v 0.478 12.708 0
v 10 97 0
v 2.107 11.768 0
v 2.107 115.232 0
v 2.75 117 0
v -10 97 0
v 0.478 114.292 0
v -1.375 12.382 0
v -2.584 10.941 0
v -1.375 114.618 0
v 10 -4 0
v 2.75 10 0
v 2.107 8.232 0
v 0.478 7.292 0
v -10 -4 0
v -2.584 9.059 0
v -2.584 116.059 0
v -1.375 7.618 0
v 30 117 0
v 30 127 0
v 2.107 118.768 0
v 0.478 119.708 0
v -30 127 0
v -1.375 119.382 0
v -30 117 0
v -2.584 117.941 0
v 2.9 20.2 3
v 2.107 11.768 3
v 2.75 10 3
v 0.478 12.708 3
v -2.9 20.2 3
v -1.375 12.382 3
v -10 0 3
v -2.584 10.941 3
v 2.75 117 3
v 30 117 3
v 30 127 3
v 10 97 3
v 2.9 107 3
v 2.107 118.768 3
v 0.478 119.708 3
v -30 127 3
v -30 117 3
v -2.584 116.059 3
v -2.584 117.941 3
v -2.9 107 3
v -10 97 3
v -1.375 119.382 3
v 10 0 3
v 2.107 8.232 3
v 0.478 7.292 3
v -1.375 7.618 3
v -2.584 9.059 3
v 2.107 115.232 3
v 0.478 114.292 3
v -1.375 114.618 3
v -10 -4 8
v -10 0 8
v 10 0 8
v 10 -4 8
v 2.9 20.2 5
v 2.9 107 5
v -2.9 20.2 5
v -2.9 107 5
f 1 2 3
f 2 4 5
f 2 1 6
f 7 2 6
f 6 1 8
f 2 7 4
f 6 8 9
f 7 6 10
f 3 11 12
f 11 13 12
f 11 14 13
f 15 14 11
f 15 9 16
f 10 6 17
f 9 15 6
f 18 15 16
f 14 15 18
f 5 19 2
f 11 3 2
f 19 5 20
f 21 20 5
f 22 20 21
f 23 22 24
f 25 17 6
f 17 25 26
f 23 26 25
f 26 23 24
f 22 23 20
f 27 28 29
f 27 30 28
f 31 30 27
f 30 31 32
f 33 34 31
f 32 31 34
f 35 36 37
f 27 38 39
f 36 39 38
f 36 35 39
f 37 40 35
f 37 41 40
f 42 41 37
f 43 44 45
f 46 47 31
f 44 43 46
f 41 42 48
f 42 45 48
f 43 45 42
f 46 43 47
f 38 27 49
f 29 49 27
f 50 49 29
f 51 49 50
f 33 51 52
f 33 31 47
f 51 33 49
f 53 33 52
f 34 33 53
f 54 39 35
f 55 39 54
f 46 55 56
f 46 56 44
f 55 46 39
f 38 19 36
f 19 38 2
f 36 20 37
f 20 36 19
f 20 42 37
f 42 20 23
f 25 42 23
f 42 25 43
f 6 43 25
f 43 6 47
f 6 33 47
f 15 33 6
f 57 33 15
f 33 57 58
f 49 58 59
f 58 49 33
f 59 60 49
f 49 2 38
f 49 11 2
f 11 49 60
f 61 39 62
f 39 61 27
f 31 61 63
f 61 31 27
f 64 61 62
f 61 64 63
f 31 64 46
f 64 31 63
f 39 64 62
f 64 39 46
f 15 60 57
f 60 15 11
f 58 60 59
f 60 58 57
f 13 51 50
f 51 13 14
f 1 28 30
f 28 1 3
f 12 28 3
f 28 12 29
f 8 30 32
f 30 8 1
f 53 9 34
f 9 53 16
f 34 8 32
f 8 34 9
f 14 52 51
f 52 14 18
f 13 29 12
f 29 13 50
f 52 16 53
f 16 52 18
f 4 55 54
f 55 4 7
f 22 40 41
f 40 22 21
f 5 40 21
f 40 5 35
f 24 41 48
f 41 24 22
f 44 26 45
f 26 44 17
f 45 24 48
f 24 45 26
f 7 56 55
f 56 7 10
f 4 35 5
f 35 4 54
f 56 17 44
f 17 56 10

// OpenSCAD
// AM8 Z frame alignment jig
tolerance = 0.2;    // makes up for tolerance in print thickness

// distance from rear of printer to rear of Z frame
// 127mm for standard AM8 design
magic_distance = 127;

// main bracket thickness
thickness = 3;
// height of 'ridge' in center of bracket above thickness
ridge_height = 2;
// height of "hook" on end of bracket above thickness
hook_height = 5;


difference() {
    union() {
        // base
        linear_extrude(height=thickness)
            polygon([[-10,0],[-10,(magic_distance-30)],[-30,(magic_distance-10)],[-30,magic_distance],[30,magic_distance],[30,(magic_distance-10)],[10,(magic_distance-30)],[10,0]]);
        // ridge
        ridge_width = 6-tolerance;
        linear_extrude(height=ridge_height+thickness)
            polygon([[-ridge_width/2,20+tolerance],[-ridge_width/2,magic_distance-20],[ridge_width/2,magic_distance-20],[ridge_width/2,20+tolerance]]);
        linear_extrude(height=thickness+hook_height)
            polygon([[-10,0],[-10,-4],[10,-4],[10,0]]);
    }
    
    translate([0,10,-0.1]) cylinder(d=5.5,h=thickness+0.2);
    translate([0,magic_distance-10,-0.1]) cylinder(d=5.5,h=thickness+0.2);
    
}
